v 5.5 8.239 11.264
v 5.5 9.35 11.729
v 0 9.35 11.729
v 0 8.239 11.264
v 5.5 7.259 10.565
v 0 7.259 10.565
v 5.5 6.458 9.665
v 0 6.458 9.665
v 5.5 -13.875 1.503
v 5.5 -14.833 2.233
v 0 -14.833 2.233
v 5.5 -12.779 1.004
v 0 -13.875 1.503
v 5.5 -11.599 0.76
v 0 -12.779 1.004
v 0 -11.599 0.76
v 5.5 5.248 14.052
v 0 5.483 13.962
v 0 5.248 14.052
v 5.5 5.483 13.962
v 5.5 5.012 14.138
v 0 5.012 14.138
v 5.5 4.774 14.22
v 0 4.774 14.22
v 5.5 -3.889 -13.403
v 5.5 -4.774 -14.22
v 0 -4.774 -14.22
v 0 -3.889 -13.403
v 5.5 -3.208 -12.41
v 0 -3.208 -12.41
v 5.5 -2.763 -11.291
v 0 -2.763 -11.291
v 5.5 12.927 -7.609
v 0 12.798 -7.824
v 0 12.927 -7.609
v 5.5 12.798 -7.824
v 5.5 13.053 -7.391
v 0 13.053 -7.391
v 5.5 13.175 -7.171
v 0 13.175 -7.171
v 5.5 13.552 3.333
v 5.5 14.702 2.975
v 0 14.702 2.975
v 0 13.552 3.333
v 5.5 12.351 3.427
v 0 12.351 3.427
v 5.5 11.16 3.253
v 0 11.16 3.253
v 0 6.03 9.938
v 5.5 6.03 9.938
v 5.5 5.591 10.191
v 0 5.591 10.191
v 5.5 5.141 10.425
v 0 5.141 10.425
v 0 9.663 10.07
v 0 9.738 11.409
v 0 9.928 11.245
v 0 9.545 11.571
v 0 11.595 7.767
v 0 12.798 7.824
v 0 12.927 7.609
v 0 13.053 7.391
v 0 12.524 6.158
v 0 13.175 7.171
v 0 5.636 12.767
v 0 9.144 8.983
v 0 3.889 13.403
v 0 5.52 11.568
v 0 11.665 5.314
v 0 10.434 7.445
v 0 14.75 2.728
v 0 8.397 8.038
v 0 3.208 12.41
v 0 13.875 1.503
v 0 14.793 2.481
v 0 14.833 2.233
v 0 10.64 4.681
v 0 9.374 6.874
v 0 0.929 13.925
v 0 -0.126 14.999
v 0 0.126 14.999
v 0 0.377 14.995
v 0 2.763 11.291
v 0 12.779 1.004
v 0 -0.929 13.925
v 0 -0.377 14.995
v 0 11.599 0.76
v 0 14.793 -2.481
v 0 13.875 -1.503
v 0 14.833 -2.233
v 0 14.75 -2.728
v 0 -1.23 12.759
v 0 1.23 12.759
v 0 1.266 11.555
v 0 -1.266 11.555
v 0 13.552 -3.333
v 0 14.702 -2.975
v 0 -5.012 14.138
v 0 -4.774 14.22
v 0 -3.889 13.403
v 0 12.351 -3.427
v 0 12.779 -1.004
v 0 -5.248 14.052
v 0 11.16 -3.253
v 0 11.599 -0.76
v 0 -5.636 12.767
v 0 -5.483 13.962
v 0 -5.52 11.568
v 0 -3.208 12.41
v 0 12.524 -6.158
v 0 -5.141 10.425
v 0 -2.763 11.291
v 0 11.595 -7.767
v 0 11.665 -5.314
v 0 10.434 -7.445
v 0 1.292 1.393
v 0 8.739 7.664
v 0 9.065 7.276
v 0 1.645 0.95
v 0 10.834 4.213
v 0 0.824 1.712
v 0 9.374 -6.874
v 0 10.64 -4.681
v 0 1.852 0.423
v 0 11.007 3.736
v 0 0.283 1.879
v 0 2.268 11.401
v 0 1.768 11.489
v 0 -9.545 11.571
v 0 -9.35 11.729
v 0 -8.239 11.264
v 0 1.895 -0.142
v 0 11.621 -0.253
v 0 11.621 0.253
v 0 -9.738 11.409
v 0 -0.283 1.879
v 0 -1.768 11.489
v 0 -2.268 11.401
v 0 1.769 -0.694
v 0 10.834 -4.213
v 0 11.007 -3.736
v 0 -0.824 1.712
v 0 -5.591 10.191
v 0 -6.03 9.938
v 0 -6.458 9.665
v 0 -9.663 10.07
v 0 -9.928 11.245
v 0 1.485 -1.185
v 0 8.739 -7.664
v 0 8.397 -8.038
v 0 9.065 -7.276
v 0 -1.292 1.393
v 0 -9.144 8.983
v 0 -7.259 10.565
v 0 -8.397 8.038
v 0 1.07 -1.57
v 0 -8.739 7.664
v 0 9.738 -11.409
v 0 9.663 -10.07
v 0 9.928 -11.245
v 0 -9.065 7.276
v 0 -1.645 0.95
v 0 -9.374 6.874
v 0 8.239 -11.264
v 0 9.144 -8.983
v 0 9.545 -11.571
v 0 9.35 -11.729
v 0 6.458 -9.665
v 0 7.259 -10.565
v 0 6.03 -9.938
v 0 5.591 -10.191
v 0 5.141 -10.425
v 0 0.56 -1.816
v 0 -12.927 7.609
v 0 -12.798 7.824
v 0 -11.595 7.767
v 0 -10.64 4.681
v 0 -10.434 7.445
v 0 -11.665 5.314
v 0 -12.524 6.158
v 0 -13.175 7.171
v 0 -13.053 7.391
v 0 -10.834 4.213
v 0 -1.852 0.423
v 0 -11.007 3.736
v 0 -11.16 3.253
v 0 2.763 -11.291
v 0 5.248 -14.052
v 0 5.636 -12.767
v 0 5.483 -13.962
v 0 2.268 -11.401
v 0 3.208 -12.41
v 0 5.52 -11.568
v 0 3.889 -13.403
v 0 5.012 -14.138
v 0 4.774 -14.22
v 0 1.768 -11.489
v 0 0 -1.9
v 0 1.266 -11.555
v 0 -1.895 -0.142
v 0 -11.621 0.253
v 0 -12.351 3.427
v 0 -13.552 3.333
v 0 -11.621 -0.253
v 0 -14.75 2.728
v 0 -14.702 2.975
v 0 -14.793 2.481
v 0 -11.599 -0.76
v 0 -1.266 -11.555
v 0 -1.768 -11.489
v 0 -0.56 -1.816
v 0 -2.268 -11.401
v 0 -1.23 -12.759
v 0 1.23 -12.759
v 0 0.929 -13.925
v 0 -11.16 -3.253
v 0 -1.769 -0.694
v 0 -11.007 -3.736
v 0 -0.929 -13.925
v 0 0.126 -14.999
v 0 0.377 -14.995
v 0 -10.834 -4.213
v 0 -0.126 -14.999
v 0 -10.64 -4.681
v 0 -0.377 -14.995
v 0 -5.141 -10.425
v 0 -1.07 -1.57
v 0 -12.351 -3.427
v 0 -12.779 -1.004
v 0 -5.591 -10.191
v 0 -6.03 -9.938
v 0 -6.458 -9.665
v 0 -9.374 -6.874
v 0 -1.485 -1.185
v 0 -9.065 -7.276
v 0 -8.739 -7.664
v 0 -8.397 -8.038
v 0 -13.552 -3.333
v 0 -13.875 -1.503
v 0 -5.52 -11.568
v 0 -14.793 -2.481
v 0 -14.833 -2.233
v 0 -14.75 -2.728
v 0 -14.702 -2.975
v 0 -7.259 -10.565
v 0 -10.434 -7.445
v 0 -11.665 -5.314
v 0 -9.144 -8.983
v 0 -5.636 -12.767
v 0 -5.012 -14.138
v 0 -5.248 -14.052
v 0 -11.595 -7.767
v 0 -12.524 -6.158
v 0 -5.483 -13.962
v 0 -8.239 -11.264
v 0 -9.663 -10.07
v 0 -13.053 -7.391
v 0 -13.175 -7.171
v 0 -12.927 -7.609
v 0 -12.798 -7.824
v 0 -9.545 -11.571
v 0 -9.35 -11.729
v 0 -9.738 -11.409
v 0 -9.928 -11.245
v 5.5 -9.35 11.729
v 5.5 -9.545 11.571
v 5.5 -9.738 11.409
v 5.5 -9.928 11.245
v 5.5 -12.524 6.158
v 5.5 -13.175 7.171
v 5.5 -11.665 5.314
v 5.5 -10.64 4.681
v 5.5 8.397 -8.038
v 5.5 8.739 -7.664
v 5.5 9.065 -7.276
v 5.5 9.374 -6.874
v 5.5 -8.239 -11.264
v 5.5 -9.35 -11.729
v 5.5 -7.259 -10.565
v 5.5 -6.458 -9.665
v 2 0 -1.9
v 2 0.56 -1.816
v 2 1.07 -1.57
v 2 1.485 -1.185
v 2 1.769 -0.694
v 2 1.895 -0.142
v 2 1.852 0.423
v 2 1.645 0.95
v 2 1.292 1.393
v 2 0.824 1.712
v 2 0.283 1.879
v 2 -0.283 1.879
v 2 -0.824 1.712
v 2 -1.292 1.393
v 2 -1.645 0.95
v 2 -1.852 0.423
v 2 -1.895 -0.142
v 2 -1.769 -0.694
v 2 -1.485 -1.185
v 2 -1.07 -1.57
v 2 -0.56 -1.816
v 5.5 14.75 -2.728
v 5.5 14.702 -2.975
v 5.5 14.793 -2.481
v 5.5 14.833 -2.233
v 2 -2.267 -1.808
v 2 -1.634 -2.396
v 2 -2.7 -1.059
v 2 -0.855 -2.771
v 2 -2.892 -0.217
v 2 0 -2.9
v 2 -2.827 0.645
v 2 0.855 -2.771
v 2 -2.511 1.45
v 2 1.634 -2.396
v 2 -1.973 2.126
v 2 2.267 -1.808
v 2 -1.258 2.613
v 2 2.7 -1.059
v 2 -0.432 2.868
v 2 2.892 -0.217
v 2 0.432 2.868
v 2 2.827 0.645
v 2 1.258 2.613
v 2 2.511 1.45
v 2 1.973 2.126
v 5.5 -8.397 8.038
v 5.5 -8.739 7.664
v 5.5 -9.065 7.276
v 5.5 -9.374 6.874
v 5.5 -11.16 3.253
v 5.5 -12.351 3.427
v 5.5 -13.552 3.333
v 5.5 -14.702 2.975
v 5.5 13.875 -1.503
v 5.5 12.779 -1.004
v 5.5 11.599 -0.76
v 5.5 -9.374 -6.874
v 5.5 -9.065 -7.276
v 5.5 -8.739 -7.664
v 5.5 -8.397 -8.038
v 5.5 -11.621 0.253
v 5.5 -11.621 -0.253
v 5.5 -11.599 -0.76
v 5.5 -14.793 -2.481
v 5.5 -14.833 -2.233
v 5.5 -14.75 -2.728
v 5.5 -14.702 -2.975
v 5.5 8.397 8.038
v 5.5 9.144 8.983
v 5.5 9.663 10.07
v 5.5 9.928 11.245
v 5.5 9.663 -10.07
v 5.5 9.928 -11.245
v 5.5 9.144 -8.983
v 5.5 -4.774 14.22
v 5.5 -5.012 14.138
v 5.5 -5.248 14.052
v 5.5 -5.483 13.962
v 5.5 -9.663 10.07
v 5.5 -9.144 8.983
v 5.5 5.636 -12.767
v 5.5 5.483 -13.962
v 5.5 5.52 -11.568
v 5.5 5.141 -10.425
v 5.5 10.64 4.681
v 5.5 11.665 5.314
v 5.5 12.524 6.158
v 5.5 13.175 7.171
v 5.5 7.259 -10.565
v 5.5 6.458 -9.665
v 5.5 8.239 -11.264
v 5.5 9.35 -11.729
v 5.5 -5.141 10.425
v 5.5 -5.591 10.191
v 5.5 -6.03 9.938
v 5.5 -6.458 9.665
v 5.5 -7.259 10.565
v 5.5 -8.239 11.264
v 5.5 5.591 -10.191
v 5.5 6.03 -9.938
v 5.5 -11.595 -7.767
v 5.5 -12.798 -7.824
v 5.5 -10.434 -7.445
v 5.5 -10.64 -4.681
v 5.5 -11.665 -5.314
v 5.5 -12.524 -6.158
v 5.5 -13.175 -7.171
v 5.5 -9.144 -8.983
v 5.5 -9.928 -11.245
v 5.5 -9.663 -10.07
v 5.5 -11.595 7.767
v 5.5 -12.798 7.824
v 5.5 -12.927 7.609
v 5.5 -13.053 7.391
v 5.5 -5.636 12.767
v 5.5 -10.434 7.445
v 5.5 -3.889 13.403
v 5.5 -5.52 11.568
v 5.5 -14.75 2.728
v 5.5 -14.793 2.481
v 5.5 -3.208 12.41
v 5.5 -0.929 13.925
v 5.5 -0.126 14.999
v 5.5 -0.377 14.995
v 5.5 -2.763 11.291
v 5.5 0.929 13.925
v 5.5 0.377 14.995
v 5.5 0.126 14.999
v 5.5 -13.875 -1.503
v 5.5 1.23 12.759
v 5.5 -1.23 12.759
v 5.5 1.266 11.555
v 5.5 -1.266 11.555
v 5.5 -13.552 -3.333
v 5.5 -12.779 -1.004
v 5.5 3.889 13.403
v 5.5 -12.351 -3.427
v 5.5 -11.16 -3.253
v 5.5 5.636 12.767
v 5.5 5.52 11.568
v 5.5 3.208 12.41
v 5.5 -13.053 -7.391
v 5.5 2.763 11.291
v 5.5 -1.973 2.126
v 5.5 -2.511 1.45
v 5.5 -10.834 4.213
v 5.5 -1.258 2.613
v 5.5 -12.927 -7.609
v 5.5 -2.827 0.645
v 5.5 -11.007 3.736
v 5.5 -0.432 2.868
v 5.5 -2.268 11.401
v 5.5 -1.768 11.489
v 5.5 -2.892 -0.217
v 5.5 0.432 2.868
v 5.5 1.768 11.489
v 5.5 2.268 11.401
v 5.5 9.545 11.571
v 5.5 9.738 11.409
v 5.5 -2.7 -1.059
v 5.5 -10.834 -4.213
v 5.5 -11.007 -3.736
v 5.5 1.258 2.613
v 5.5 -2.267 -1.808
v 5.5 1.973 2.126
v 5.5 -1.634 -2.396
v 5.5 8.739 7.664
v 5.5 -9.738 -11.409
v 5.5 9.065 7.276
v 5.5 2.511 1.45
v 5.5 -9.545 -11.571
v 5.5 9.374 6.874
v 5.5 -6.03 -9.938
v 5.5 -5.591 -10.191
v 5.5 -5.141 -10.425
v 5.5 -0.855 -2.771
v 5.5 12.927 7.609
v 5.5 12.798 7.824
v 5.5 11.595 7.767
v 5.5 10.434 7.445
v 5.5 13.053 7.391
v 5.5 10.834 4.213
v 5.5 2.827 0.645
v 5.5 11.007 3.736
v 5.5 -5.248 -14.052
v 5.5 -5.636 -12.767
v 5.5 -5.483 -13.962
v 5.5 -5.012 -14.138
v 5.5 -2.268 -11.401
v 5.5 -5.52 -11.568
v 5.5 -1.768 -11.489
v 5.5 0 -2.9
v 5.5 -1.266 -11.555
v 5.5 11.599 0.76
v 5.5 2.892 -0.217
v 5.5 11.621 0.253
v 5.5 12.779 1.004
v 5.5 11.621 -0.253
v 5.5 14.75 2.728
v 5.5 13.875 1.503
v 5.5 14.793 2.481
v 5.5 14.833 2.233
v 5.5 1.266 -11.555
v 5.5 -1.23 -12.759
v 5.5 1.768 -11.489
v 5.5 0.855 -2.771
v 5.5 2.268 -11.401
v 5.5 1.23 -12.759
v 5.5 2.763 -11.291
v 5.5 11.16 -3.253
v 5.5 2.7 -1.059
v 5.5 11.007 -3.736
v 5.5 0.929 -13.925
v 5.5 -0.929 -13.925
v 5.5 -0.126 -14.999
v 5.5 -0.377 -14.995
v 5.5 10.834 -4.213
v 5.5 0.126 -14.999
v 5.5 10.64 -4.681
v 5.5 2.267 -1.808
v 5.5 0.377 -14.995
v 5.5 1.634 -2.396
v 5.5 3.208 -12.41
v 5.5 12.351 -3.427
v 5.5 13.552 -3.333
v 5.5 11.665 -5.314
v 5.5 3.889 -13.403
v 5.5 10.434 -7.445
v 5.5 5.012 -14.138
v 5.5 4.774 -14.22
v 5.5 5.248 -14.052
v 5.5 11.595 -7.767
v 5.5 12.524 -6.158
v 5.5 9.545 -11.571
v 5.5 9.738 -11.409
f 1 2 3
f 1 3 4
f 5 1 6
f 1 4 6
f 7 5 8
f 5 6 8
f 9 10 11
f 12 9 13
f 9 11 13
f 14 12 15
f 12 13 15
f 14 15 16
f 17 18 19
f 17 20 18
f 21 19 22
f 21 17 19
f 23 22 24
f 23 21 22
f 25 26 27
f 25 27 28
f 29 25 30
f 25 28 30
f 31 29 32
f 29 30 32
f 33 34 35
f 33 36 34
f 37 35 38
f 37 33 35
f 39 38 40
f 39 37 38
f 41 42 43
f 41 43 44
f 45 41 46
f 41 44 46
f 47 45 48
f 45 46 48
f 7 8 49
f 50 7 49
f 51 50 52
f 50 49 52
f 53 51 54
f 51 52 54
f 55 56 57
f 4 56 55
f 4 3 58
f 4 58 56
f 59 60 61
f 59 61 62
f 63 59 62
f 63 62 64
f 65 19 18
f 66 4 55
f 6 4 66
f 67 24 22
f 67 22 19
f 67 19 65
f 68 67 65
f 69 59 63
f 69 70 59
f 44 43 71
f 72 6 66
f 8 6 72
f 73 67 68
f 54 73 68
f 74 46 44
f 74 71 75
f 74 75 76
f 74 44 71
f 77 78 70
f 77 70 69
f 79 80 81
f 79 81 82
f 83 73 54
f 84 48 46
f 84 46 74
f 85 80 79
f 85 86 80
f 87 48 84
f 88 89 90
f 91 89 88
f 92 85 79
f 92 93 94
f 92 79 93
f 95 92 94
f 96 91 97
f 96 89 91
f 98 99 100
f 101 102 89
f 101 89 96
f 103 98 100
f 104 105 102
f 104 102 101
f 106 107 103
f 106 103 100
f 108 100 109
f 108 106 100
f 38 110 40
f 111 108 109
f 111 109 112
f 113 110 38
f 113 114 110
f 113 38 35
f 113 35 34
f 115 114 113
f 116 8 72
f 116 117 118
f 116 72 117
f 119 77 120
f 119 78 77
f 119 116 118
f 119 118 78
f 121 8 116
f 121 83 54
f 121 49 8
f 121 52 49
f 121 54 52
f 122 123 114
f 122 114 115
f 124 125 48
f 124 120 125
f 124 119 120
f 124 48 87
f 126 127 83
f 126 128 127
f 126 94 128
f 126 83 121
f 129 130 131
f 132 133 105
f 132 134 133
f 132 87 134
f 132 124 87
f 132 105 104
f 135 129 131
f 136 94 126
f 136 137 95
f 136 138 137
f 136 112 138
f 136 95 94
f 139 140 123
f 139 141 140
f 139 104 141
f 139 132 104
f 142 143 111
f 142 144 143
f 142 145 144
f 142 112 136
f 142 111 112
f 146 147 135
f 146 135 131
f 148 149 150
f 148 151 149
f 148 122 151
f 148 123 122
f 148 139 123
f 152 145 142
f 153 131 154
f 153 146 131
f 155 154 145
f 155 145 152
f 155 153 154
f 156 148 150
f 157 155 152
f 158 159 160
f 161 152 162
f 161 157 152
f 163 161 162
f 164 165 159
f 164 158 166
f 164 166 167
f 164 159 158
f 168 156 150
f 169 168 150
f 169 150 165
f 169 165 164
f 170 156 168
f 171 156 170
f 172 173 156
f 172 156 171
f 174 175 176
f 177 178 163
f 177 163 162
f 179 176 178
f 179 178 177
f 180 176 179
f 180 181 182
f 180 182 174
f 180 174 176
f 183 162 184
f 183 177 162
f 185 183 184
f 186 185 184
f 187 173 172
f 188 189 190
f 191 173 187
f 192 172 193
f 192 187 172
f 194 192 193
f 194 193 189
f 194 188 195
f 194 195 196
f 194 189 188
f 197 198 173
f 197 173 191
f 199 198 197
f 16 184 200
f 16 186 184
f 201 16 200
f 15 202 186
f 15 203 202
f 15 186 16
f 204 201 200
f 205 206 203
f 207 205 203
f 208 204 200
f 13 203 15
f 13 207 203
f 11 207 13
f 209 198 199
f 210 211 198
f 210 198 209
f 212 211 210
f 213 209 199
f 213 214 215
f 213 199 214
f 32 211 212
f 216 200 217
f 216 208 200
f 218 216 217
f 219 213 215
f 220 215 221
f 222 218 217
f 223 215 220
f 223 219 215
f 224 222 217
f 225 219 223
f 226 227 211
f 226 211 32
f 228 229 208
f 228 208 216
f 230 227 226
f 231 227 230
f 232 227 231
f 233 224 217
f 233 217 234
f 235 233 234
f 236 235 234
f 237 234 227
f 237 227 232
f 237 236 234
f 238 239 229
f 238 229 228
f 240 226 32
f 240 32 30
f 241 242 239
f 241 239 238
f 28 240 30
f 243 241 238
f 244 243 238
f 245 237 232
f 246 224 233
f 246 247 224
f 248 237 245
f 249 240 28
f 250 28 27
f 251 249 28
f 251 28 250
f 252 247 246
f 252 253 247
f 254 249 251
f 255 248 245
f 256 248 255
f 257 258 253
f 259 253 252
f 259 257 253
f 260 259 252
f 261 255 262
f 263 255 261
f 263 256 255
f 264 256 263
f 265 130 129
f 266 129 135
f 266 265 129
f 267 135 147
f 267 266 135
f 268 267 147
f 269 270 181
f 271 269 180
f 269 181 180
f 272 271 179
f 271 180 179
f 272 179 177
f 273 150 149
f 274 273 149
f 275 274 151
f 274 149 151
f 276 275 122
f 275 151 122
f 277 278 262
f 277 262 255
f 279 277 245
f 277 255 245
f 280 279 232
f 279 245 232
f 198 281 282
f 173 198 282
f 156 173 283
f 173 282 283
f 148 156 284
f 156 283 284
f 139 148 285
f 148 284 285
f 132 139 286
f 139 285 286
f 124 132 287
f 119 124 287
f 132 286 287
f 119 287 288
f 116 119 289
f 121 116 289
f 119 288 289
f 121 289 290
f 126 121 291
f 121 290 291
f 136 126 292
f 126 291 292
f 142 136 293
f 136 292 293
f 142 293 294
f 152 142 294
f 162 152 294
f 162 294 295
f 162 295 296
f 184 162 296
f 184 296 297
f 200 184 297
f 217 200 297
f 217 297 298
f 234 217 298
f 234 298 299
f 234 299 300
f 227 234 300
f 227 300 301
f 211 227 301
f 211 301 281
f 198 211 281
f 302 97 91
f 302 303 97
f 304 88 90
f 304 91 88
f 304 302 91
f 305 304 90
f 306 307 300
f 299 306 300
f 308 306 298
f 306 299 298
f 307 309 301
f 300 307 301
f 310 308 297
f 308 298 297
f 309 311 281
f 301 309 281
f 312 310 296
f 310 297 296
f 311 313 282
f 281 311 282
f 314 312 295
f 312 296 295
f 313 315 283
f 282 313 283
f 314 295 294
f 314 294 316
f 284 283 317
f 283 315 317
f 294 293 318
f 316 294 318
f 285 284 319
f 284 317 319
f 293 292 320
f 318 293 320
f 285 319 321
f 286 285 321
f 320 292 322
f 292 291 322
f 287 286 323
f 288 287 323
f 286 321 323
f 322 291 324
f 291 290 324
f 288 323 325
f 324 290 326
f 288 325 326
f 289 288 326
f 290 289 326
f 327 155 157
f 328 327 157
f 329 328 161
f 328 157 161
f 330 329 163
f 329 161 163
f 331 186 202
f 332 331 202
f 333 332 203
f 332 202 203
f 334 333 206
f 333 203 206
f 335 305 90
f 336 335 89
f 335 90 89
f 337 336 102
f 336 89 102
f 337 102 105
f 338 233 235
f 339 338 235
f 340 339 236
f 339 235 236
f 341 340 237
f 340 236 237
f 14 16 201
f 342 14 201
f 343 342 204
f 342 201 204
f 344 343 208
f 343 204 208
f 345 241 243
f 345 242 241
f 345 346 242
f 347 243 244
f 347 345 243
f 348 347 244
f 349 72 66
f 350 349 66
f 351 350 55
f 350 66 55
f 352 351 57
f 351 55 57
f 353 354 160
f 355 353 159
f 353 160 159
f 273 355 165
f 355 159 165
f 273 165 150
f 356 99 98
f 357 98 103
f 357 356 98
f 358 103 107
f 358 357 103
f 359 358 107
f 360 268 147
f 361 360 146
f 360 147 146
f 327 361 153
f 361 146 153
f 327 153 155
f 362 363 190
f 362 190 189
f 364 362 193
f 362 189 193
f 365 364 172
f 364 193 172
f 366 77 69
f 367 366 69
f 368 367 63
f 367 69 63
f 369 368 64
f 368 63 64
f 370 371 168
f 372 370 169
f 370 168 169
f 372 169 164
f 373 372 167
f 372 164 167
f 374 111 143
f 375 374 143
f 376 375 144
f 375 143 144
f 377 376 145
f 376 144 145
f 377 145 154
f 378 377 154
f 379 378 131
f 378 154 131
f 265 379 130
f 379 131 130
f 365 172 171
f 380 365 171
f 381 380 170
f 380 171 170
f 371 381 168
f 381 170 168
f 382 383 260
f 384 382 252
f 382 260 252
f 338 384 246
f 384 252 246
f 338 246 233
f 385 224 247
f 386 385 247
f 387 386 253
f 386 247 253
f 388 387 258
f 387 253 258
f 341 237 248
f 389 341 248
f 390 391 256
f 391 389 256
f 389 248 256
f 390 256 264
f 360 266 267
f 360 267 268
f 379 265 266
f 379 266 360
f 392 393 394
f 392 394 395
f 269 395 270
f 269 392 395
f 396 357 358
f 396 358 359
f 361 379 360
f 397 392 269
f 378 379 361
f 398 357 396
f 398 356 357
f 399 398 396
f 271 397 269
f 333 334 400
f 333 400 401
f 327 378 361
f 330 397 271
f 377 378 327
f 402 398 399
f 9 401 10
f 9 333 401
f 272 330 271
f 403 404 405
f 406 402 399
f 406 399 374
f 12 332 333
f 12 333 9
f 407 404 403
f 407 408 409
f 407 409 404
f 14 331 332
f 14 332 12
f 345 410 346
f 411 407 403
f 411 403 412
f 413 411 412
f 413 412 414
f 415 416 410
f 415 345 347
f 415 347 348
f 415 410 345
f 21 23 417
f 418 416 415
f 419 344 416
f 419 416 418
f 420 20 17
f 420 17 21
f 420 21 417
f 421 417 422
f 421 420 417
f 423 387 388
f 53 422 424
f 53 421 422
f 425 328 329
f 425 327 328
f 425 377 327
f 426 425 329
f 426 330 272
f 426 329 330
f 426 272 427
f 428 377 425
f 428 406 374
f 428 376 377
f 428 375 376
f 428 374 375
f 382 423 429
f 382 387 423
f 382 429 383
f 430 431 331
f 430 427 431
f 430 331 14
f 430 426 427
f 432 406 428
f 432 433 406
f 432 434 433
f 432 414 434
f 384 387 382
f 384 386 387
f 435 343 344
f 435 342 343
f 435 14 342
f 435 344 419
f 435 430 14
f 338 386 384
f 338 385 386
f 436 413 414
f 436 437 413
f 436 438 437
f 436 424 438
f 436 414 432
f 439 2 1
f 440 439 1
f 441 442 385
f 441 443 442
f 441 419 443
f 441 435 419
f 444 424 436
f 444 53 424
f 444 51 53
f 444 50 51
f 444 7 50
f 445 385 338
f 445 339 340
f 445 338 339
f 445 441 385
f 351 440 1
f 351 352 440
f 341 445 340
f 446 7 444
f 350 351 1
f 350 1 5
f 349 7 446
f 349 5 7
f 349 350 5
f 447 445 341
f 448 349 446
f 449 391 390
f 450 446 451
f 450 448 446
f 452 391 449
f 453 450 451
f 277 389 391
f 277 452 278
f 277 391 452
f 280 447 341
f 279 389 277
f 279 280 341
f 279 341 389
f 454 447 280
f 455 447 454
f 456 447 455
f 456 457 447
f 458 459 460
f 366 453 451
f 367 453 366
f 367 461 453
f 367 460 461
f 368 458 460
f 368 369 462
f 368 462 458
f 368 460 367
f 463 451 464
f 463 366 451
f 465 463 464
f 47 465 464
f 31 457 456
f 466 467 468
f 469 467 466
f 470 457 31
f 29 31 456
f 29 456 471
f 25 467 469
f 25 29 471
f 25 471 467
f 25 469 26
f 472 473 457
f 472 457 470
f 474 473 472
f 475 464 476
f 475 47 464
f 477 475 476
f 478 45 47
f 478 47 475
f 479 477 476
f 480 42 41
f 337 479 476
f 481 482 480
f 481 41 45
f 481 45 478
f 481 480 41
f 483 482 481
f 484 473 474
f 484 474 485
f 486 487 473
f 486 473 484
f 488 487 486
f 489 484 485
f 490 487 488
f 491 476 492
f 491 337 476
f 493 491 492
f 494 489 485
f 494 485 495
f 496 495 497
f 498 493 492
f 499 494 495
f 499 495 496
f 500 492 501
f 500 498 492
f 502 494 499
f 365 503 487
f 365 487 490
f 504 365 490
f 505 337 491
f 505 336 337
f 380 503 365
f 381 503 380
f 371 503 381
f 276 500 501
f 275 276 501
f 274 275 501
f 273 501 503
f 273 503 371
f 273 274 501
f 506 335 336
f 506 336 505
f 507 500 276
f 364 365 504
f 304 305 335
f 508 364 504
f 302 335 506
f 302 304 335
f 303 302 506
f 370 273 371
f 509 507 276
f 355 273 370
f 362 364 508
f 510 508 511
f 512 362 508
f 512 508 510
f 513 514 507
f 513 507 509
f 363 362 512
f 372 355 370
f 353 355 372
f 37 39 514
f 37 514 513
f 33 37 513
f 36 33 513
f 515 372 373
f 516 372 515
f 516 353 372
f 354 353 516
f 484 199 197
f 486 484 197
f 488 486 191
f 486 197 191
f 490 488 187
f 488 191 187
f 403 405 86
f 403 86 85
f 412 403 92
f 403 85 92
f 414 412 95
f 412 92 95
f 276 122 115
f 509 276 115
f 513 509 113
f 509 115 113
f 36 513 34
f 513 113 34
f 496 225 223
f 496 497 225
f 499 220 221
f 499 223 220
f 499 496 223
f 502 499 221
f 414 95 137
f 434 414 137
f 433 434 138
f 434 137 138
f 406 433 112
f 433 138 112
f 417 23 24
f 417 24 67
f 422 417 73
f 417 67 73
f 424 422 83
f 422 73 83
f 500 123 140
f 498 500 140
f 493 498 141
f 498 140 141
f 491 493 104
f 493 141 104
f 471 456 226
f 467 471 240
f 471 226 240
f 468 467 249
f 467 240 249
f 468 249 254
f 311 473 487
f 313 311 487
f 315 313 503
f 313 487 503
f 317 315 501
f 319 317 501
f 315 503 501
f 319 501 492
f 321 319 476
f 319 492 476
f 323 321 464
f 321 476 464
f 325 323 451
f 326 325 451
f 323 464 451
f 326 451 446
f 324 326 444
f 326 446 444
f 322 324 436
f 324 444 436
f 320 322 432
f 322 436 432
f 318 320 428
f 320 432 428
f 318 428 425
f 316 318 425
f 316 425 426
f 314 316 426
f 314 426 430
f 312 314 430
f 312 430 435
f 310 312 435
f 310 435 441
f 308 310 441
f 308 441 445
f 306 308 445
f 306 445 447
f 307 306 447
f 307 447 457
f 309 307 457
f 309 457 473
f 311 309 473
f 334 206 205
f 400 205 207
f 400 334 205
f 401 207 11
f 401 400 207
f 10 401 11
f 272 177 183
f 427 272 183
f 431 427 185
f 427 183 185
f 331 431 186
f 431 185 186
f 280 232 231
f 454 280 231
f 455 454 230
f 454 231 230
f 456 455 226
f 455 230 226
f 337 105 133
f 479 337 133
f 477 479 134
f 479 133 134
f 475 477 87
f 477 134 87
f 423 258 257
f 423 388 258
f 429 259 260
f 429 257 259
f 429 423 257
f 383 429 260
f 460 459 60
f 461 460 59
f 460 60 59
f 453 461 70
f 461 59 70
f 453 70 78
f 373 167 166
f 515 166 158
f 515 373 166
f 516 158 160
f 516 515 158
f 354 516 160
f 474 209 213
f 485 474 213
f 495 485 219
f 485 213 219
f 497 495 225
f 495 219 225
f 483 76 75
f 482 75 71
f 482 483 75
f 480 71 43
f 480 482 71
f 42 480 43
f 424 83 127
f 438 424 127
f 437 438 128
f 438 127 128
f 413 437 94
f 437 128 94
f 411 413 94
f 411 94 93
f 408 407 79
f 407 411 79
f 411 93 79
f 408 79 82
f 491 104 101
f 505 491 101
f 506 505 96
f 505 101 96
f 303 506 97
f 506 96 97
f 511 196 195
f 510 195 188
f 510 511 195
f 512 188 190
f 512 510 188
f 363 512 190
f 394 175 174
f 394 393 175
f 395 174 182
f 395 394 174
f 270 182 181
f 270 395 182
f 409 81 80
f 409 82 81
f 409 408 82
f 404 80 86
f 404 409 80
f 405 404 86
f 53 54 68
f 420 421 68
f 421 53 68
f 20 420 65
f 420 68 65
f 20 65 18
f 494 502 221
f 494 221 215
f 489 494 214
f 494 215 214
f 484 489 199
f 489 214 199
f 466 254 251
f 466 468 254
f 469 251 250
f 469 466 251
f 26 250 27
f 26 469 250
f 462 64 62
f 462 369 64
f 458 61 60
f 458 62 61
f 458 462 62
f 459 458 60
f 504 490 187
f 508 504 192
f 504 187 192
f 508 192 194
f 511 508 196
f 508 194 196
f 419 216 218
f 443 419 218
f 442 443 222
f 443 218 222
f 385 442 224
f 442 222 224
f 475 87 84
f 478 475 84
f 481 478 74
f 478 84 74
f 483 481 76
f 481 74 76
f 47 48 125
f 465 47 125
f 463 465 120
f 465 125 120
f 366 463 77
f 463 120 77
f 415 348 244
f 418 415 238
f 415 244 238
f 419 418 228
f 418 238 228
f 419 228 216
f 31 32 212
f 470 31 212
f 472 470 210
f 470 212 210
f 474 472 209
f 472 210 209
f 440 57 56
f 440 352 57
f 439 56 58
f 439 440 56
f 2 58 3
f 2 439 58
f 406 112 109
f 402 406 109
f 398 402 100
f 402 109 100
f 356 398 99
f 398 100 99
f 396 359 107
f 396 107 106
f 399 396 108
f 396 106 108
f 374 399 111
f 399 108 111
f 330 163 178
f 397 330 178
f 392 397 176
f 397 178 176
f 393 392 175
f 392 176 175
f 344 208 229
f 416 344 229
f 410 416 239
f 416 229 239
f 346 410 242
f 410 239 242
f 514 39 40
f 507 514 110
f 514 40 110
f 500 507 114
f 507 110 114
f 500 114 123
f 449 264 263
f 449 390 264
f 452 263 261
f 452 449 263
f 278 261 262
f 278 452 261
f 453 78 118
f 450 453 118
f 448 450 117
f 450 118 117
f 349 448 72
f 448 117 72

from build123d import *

# Parameters (mm, degrees)
BASPROSKE_W             = 7
BASPROSKE_H             = 15
TOOTHCUT_DEPTH          = 23.338307904
TEETHCUTS_COUNT         = 18
TEETHCUTS_ANGLE         = 340
BORSKE_R                = 2.5
BORE_DEPTH              = 50.0000508
CROQUIS1_R              = 2.9
CORTAR_EXTRUIR1_DEPTH   = 10
CROQUIS4_R              = 3.489132724
SALIENTE_EXTRUIR1_DEPTH = 2
CROQUIS5_R              = 1.9
CORTAR_EXTRUIR3_DEPTH   = 5
CROQUIS6_R              = 21.972687295
CORTAR_EXTRUIR4_DEPTH   = 1.5


with BuildPart() as part:
    # BasProSke → Base-Revolve (revolve)
    with BuildSketch(Plane(origin=(0, 0, 0), x_dir=(1, 0, 0), z_dir=(0, 1, 0)), mode=Mode.PRIVATE) as base_revolve_sk:
        with Locations((3.5, 7.5)):
            Rectangle(BASPROSKE_W, BASPROSKE_H)
    revolve(base_revolve_sk.sketch.rotate(Axis((-10, 0, 0), (1, 0, 0)), 180), axis=Axis((-10, 0, 0), (1, 0, 0)))

    # TooCutSke → ToothCut (cut, through all)
    with BuildSketch(Plane(origin=(0, 0, 0), x_dir=(0, 0, -1), z_dir=(1, 0, 0))):
        with BuildLine():
            ThreePointArc((0.759974923, 11.599129886), (0, 11.624), (-0.759974923, 11.599129886))
            ThreePointArc((-0.759974923, 11.599129886), (-1.229186471, 13.354767823), (-2.254227748, 14.855339189))
            ThreePointArc((-2.254227748, 14.855339189), (0, 15.0254), (2.254227748, 14.855339189))
            ThreePointArc((2.254227748, 14.855339189), (1.229186471, 13.354767823), (0.759974923, 11.599129886))
        make_face()
    toothcut = extrude(amount=TOOTHCUT_DEPTH, mode=Mode.SUBTRACT)

    # TeethCuts: ToothCut ×18 about axis
    teethcuts_axis = Axis((-10, 0, 0), (1, 0, 0))
    for i in range(1, TEETHCUTS_COUNT):
        add(toothcut.rotate(teethcuts_axis, i * TEETHCUTS_ANGLE / (TEETHCUTS_COUNT - 1)), mode=Mode.SUBTRACT)

    # BorSke → Bore (cut, symmetric)
    with BuildSketch(Plane(origin=(0, 0, 0), x_dir=(0, 0, -1), z_dir=(1, 0, 0))):
        with Locations(Location((0, 0, 0), (0, 0, 180))):
            Circle(BORSKE_R)
    extrude(amount=BORE_DEPTH, both=True, mode=Mode.SUBTRACT)

    # Croquis1 → Cortar-Extruir1 (cut)
    with BuildSketch(Plane(origin=(7, 0, 0), x_dir=(0, 0, -1), z_dir=(1, 0, 0))):
        Circle(CROQUIS1_R)
    extrude(amount=-CORTAR_EXTRUIR1_DEPTH, mode=Mode.SUBTRACT)

    # Croquis4 → Saliente-Extruir1 (add, through all)
    with BuildSketch(Plane.ZY.offset(-2)):
        Circle(CROQUIS4_R)
    extrude(amount=SALIENTE_EXTRUIR1_DEPTH)

    # Croquis5 → Cortar-Extruir3 (cut)
    with BuildSketch(Plane(origin=(2, 0, 0), x_dir=(0, 0, -1), z_dir=(1, 0, 0))):
        Circle(CROQUIS5_R)
    extrude(amount=-CORTAR_EXTRUIR3_DEPTH, mode=Mode.SUBTRACT)

    # Croquis6 → Cortar-Extruir4 (cut)
    with BuildSketch(Plane(origin=(7, 0, 0), x_dir=(0, 0, -1), z_dir=(1, 0, 0))):
        Circle(CROQUIS6_R)
    extrude(amount=-CORTAR_EXTRUIR4_DEPTH, mode=Mode.SUBTRACT)


solid = part.part
